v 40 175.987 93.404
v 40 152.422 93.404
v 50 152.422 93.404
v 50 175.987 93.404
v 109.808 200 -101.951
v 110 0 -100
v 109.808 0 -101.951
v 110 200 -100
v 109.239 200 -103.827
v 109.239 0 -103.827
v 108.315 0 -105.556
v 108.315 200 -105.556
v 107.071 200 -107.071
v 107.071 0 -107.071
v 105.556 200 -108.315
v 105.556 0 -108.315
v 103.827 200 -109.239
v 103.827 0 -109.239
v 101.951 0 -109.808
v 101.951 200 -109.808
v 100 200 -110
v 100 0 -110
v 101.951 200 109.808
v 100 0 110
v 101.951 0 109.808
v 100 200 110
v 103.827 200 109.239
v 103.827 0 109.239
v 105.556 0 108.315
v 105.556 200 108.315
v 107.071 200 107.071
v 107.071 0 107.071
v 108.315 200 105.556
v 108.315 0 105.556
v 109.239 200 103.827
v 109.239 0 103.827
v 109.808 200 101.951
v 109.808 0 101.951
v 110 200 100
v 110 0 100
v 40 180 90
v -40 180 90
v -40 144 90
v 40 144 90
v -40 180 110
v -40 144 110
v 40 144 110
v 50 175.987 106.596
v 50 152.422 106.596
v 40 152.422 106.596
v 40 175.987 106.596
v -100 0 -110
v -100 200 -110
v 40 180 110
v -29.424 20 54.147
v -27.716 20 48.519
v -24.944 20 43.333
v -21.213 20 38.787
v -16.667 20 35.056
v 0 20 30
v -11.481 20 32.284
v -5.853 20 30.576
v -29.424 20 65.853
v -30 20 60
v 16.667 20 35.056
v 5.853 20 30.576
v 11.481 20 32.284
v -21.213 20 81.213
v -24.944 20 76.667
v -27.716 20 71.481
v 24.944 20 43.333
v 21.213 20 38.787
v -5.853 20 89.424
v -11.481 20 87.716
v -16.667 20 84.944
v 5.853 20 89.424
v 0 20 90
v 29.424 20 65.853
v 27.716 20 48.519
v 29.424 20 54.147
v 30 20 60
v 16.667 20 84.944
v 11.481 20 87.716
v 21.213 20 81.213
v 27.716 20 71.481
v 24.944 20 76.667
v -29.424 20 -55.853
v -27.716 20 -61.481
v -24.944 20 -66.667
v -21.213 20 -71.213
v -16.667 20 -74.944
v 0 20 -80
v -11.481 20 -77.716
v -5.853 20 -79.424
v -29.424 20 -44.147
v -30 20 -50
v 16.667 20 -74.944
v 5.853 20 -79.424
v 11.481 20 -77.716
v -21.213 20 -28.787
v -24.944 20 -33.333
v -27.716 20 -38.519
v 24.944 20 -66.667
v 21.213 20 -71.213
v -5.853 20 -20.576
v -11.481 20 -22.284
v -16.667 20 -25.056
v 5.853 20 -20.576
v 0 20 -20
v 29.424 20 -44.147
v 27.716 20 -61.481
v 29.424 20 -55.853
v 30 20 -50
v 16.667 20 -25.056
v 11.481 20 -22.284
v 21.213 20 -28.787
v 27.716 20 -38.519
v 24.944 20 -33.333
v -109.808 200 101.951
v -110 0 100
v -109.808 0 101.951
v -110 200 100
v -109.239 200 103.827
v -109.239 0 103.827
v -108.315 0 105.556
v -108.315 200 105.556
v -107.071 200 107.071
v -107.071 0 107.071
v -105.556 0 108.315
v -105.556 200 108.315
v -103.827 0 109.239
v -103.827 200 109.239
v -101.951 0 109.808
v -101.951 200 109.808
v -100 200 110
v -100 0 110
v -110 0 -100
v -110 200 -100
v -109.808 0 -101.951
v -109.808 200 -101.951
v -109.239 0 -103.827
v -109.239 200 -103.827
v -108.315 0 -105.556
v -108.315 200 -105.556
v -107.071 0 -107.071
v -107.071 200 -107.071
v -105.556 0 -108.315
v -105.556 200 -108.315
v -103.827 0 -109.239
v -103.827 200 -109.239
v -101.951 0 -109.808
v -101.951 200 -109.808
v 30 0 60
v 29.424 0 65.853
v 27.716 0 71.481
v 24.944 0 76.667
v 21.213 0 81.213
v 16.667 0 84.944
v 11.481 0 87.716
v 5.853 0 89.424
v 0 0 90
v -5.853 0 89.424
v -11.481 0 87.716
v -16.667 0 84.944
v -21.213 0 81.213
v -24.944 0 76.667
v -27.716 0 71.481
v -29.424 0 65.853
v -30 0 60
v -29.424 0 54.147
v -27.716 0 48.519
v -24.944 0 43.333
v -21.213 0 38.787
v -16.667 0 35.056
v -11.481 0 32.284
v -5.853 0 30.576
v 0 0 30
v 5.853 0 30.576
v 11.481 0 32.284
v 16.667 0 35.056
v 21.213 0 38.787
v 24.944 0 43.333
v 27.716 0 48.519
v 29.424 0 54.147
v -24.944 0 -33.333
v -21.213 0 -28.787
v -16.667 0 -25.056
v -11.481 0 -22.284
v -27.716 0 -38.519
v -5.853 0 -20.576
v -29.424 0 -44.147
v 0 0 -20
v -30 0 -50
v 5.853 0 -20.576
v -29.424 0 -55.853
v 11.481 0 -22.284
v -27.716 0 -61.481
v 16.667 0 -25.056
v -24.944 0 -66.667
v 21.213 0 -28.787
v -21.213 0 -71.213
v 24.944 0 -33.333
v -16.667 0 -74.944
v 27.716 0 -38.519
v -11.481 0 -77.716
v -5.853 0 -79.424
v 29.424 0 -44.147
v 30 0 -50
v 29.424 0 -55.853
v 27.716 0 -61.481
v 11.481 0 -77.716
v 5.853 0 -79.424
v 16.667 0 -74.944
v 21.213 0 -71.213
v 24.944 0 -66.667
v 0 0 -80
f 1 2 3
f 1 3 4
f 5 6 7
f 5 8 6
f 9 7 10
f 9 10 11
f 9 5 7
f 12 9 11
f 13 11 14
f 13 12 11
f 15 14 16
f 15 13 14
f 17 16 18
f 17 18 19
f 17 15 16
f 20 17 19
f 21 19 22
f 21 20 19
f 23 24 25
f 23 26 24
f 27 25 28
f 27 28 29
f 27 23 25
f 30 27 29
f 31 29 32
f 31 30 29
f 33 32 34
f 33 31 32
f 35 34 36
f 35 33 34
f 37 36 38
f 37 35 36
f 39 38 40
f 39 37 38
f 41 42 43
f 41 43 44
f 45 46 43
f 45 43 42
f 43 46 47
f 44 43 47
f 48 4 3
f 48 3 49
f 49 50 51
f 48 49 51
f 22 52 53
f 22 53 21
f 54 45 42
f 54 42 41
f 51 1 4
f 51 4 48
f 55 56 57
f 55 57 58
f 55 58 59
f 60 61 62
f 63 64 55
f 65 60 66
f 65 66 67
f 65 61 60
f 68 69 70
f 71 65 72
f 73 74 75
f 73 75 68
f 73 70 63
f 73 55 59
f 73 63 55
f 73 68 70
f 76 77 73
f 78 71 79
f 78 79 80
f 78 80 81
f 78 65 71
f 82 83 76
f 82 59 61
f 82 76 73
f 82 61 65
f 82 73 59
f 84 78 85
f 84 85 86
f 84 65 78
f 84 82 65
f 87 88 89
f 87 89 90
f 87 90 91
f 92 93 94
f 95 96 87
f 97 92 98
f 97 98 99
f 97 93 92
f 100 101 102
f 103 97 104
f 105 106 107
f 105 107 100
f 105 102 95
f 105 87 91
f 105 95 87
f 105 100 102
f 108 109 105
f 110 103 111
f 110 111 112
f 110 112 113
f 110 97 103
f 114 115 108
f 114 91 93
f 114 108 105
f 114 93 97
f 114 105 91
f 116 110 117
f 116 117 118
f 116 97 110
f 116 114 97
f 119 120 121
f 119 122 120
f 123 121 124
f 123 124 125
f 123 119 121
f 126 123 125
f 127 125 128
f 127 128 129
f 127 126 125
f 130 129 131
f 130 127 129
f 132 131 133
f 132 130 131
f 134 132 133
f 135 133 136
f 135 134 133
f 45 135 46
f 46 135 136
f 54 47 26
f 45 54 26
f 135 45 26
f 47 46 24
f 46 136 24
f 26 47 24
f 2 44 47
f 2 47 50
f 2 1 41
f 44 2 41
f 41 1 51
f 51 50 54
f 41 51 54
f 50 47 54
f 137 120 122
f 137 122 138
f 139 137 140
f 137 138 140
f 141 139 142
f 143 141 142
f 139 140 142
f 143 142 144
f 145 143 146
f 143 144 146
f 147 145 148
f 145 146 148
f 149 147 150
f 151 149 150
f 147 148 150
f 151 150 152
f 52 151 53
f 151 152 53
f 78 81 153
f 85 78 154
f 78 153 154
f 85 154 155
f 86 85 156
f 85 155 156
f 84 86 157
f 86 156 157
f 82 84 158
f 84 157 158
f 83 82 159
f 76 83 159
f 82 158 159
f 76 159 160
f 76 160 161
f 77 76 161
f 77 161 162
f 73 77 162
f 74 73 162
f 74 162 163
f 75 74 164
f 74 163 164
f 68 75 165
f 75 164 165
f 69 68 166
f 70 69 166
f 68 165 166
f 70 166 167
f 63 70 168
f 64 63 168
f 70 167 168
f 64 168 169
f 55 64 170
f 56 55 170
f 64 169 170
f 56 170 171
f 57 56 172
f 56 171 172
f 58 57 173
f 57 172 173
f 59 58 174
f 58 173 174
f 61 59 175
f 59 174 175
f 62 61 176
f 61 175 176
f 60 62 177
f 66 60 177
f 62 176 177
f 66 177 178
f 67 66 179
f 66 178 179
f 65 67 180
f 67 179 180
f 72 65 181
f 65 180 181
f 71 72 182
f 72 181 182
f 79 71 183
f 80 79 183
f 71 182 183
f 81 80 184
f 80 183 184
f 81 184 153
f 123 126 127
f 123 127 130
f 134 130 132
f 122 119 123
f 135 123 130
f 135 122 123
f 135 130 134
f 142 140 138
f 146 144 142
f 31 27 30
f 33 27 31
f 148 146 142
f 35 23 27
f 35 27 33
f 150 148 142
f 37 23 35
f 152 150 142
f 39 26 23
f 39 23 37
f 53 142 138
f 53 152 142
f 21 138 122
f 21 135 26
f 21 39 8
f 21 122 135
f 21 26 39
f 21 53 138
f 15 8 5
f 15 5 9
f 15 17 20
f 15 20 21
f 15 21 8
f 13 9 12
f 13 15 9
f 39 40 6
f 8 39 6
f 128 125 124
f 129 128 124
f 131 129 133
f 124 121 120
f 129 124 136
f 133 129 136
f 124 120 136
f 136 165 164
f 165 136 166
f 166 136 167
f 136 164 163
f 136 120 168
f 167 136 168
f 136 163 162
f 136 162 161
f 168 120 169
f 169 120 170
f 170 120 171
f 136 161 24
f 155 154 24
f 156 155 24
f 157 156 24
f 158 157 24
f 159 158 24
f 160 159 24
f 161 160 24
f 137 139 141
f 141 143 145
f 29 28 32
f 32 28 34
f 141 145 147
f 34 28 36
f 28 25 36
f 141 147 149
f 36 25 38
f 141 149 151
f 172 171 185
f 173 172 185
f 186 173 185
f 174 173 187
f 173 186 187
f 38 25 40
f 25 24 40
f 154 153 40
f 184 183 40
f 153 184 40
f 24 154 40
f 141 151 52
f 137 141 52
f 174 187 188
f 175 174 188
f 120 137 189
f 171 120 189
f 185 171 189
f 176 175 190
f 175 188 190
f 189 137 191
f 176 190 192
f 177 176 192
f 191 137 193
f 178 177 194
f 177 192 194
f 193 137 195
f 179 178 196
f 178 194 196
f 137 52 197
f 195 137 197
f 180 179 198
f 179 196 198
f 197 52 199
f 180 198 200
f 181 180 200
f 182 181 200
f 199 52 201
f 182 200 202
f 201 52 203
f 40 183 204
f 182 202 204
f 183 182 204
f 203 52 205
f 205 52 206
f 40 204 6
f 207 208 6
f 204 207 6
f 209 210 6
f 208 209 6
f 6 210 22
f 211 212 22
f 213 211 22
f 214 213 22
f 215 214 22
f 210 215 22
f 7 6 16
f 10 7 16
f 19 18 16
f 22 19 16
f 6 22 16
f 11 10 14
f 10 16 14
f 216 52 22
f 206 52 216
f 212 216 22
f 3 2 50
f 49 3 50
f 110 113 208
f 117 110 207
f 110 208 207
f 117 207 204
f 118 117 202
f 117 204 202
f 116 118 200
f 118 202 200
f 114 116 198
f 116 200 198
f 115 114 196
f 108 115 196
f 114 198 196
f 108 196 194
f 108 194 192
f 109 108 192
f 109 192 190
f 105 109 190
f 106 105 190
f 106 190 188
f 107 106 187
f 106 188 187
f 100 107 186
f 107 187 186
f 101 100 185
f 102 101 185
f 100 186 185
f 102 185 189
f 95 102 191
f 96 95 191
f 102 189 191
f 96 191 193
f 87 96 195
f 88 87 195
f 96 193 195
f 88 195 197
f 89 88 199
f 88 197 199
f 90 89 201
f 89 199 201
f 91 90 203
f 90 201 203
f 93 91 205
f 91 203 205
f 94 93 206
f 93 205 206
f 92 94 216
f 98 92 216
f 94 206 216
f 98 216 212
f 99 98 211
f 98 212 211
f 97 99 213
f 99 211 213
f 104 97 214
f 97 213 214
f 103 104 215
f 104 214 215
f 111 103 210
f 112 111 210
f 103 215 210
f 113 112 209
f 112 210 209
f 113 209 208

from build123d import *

# Parameters (mm, degrees)
SKETCH1_W           = 220
SKETCH1_H           = 220
BOSS_EXTRUDE1_DEPTH = 200
FILLET1_R           = 10
SKETCH2_R           = 30
CUT_EXTRUDE1_DEPTH  = 20
SKETCH3_W           = 80
SKETCH3_H           = 36
CUT_EXTRUDE2_DEPTH  = 20
SKETCH4_W           = 13.191247326
SKETCH4_H           = 23.565374265
CUT_EXTRUDE3_DEPTH  = 10


with BuildPart() as part:
    # Sketch1 → Boss-Extrude1 (new body)
    with BuildSketch(Plane(origin=(0, 0, 0), x_dir=(1, 0, 0), z_dir=(0, 1, 0))):
        Rectangle(SKETCH1_W, SKETCH1_H)
    extrude(amount=BOSS_EXTRUDE1_DEPTH)

    # Fillet1
    fillet1_edges = [part.edges().sort_by_distance(p)[0] for p in [
        (110, 100, 110),
        (-110, 100, 110),
        (-110, 100, -110),
        (110, 100, -110),
    ]]
    fillet(fillet1_edges, radius=FILLET1_R)

    # Sketch2 → Cut-Extrude1 (cut)
    with BuildSketch(Plane.XZ):
        with Locations((0, -50)):
            Circle(SKETCH2_R)
        with Locations((0, 60)):
            Circle(SKETCH2_R)
    extrude(amount=-CUT_EXTRUDE1_DEPTH, mode=Mode.SUBTRACT)

    # Sketch3 → Cut-Extrude2 (cut)
    with BuildSketch(Plane.XY.offset(110)):
        with Locations((0, 162)):
            Rectangle(SKETCH3_W, SKETCH3_H)
    extrude(amount=-CUT_EXTRUDE2_DEPTH, mode=Mode.SUBTRACT)

    # Sketch4 → Cut-Extrude3 (cut)
    with BuildSketch(Plane.ZY.offset(-40)):
        with Locations((100, 164.204493947)):
            Rectangle(SKETCH4_W, SKETCH4_H)
    extrude(amount=-CUT_EXTRUDE3_DEPTH, mode=Mode.SUBTRACT)


solid = part.part
